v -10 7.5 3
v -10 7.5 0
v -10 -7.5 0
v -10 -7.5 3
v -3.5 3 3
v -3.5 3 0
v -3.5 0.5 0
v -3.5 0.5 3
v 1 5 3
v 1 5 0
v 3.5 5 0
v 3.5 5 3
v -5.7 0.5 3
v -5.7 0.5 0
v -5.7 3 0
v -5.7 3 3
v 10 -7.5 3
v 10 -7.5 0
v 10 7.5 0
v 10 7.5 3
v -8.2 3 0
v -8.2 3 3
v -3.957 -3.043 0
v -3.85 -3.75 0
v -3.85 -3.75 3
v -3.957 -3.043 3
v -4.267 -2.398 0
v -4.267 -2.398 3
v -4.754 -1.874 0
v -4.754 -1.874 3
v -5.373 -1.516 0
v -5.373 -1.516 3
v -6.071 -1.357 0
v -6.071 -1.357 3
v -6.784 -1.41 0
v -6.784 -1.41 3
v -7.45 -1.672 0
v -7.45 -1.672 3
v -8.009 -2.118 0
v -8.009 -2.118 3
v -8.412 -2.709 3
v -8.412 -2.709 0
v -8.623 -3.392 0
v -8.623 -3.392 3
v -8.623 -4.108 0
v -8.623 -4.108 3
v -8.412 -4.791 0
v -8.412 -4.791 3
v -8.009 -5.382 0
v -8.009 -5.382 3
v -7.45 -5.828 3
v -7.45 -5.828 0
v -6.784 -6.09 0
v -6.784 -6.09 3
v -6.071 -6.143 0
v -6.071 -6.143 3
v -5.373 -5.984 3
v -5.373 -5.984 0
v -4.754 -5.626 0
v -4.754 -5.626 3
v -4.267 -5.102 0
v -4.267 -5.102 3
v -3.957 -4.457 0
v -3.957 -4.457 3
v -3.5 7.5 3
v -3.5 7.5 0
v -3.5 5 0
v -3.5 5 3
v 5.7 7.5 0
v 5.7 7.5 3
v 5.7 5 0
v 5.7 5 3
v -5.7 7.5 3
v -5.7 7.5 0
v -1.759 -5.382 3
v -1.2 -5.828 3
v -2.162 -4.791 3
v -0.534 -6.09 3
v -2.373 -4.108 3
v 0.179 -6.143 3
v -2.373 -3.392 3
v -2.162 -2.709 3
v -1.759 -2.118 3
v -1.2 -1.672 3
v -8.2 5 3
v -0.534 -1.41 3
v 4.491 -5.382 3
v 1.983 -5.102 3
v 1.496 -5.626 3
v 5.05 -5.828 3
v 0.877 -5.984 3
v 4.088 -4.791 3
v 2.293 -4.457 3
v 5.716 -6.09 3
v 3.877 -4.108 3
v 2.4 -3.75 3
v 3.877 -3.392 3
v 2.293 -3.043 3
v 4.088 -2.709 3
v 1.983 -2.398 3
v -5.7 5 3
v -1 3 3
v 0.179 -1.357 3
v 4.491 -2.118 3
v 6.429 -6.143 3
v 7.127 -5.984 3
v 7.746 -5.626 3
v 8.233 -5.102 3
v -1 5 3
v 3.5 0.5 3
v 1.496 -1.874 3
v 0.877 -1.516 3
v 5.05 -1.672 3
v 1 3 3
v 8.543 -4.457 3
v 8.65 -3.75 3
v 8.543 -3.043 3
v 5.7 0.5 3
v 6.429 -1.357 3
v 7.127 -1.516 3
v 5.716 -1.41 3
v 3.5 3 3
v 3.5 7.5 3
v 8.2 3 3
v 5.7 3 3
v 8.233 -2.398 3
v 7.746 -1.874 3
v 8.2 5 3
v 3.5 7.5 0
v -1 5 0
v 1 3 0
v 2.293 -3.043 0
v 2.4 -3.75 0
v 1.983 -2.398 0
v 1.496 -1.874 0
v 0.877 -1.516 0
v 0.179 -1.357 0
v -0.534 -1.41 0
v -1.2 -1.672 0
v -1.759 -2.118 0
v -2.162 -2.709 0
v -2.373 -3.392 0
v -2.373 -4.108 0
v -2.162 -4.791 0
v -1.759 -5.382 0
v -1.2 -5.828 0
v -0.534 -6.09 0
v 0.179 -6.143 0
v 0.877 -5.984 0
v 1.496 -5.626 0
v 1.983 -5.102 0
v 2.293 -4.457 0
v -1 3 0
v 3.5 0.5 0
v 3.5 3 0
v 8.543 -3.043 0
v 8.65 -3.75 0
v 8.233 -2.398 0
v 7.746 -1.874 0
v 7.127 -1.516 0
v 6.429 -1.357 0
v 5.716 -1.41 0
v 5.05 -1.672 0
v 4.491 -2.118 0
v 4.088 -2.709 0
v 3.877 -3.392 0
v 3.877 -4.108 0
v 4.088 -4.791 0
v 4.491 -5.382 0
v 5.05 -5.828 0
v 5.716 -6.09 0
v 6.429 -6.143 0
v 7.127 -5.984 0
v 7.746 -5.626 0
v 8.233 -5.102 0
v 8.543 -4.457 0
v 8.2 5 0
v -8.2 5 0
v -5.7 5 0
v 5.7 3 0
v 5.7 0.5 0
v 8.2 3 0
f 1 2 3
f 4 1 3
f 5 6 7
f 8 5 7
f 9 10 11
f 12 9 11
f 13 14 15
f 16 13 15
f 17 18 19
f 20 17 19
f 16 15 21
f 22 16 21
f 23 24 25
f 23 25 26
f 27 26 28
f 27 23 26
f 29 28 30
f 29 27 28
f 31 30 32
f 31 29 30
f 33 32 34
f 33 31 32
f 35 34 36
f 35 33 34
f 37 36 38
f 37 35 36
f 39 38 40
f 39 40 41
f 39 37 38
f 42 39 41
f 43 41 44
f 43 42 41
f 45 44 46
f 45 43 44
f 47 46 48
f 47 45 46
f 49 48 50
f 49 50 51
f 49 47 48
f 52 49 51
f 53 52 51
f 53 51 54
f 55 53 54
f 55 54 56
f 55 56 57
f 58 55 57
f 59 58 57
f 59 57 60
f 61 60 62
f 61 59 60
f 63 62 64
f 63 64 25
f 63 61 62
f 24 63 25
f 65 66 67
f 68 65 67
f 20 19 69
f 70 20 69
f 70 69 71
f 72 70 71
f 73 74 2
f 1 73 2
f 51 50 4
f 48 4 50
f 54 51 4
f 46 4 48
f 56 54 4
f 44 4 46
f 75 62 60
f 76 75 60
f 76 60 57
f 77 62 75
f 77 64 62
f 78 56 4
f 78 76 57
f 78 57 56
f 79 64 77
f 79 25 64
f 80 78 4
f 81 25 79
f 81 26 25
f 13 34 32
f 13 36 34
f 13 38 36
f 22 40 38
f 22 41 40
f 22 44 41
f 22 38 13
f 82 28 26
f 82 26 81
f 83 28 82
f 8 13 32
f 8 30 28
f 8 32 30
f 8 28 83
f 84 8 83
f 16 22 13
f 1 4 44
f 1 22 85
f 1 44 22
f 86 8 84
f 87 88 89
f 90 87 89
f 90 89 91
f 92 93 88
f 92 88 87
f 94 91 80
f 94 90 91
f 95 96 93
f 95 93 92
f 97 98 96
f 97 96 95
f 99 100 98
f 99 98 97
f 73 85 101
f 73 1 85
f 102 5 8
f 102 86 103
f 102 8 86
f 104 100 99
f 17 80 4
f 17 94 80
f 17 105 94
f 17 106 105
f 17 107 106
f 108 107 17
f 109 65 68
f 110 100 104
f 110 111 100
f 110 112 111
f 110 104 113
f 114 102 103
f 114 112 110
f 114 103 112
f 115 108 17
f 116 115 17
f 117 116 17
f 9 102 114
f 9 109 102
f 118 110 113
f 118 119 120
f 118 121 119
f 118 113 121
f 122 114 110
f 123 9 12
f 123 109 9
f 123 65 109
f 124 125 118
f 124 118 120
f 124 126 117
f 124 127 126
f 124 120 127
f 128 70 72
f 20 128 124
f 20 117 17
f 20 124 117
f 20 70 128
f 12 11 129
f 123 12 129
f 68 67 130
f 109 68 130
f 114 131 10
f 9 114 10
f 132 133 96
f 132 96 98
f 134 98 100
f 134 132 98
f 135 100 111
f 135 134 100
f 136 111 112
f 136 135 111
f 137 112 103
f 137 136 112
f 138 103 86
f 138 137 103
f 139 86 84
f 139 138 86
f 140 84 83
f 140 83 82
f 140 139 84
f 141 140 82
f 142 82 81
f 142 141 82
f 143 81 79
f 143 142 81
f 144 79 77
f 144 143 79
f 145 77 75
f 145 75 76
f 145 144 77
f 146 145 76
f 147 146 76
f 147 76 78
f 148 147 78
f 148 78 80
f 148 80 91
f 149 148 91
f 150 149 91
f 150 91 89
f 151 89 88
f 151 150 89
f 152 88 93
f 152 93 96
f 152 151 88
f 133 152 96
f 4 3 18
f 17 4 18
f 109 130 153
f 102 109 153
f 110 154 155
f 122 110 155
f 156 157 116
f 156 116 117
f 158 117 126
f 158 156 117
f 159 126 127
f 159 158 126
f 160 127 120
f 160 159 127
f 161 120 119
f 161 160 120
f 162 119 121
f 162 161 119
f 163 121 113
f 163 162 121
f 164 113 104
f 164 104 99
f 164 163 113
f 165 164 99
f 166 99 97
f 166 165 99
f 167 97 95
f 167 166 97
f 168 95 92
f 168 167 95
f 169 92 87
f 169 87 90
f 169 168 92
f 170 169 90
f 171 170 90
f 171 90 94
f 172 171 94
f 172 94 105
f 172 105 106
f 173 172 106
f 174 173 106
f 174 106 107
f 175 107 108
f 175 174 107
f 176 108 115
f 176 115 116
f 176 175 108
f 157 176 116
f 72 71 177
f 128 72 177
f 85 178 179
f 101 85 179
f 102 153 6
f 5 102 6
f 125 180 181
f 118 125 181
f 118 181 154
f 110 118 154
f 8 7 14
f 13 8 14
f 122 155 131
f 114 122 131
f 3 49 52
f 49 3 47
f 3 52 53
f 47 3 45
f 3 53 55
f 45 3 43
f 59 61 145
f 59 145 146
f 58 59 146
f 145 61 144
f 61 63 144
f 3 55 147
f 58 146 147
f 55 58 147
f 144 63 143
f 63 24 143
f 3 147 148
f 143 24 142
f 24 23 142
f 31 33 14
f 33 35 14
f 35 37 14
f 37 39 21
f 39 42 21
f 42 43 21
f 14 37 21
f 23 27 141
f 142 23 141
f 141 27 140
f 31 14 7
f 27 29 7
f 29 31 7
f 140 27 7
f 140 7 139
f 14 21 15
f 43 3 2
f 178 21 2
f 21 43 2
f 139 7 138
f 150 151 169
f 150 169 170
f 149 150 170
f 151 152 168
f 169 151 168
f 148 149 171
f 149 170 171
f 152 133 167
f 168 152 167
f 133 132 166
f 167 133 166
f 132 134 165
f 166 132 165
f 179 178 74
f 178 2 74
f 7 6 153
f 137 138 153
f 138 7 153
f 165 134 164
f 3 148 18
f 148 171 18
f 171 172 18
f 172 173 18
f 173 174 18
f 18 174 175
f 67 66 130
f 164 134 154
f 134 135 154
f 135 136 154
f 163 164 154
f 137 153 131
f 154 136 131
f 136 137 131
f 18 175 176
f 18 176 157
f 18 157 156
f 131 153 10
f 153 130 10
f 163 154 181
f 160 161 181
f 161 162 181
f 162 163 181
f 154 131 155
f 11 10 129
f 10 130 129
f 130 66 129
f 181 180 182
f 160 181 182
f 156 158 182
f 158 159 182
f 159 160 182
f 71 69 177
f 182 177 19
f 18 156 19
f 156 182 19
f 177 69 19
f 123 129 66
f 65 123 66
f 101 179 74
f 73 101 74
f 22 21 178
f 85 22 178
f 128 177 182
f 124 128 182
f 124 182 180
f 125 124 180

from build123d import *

# Parameters (mm, degrees)
SKETCH1_R           = 2.4
BOSS_EXTRUDE1_DEPTH = 3


with BuildPart() as part:
    # Sketch1 → Boss-Extrude1 (new body)
    with BuildSketch(Plane.XY):
        Polygon((-10, -7.5), (10, -7.5), (10, 7.5), (5.7, 7.5), (5.7, 5), (8.2, 5), (8.2, 3), (5.7, 3), (5.7, 0.5), (3.5, 0.5), (3.5, 3), (1, 3), (1, 5), (3.5, 5), (3.5, 7.5), (-3.5, 7.5), (-3.5, 5), (-1, 5), (-1, 3), (-3.5, 3), (-3.5, 0.5), (-5.7, 0.5), (-5.7, 3), (-8.2, 3), (-8.2, 5), (-5.7, 5), (-5.7, 7.5), (-10, 7.5), align=None)
        with Locations((0, -3.75)):
            Circle(SKETCH1_R, mode=Mode.SUBTRACT)
        with Locations((-6.25, -3.75)):
            Circle(SKETCH1_R, mode=Mode.SUBTRACT)
        with Locations((6.25, -3.75)):
            Circle(SKETCH1_R, mode=Mode.SUBTRACT)
    extrude(amount=BOSS_EXTRUDE1_DEPTH)


solid = part.part
